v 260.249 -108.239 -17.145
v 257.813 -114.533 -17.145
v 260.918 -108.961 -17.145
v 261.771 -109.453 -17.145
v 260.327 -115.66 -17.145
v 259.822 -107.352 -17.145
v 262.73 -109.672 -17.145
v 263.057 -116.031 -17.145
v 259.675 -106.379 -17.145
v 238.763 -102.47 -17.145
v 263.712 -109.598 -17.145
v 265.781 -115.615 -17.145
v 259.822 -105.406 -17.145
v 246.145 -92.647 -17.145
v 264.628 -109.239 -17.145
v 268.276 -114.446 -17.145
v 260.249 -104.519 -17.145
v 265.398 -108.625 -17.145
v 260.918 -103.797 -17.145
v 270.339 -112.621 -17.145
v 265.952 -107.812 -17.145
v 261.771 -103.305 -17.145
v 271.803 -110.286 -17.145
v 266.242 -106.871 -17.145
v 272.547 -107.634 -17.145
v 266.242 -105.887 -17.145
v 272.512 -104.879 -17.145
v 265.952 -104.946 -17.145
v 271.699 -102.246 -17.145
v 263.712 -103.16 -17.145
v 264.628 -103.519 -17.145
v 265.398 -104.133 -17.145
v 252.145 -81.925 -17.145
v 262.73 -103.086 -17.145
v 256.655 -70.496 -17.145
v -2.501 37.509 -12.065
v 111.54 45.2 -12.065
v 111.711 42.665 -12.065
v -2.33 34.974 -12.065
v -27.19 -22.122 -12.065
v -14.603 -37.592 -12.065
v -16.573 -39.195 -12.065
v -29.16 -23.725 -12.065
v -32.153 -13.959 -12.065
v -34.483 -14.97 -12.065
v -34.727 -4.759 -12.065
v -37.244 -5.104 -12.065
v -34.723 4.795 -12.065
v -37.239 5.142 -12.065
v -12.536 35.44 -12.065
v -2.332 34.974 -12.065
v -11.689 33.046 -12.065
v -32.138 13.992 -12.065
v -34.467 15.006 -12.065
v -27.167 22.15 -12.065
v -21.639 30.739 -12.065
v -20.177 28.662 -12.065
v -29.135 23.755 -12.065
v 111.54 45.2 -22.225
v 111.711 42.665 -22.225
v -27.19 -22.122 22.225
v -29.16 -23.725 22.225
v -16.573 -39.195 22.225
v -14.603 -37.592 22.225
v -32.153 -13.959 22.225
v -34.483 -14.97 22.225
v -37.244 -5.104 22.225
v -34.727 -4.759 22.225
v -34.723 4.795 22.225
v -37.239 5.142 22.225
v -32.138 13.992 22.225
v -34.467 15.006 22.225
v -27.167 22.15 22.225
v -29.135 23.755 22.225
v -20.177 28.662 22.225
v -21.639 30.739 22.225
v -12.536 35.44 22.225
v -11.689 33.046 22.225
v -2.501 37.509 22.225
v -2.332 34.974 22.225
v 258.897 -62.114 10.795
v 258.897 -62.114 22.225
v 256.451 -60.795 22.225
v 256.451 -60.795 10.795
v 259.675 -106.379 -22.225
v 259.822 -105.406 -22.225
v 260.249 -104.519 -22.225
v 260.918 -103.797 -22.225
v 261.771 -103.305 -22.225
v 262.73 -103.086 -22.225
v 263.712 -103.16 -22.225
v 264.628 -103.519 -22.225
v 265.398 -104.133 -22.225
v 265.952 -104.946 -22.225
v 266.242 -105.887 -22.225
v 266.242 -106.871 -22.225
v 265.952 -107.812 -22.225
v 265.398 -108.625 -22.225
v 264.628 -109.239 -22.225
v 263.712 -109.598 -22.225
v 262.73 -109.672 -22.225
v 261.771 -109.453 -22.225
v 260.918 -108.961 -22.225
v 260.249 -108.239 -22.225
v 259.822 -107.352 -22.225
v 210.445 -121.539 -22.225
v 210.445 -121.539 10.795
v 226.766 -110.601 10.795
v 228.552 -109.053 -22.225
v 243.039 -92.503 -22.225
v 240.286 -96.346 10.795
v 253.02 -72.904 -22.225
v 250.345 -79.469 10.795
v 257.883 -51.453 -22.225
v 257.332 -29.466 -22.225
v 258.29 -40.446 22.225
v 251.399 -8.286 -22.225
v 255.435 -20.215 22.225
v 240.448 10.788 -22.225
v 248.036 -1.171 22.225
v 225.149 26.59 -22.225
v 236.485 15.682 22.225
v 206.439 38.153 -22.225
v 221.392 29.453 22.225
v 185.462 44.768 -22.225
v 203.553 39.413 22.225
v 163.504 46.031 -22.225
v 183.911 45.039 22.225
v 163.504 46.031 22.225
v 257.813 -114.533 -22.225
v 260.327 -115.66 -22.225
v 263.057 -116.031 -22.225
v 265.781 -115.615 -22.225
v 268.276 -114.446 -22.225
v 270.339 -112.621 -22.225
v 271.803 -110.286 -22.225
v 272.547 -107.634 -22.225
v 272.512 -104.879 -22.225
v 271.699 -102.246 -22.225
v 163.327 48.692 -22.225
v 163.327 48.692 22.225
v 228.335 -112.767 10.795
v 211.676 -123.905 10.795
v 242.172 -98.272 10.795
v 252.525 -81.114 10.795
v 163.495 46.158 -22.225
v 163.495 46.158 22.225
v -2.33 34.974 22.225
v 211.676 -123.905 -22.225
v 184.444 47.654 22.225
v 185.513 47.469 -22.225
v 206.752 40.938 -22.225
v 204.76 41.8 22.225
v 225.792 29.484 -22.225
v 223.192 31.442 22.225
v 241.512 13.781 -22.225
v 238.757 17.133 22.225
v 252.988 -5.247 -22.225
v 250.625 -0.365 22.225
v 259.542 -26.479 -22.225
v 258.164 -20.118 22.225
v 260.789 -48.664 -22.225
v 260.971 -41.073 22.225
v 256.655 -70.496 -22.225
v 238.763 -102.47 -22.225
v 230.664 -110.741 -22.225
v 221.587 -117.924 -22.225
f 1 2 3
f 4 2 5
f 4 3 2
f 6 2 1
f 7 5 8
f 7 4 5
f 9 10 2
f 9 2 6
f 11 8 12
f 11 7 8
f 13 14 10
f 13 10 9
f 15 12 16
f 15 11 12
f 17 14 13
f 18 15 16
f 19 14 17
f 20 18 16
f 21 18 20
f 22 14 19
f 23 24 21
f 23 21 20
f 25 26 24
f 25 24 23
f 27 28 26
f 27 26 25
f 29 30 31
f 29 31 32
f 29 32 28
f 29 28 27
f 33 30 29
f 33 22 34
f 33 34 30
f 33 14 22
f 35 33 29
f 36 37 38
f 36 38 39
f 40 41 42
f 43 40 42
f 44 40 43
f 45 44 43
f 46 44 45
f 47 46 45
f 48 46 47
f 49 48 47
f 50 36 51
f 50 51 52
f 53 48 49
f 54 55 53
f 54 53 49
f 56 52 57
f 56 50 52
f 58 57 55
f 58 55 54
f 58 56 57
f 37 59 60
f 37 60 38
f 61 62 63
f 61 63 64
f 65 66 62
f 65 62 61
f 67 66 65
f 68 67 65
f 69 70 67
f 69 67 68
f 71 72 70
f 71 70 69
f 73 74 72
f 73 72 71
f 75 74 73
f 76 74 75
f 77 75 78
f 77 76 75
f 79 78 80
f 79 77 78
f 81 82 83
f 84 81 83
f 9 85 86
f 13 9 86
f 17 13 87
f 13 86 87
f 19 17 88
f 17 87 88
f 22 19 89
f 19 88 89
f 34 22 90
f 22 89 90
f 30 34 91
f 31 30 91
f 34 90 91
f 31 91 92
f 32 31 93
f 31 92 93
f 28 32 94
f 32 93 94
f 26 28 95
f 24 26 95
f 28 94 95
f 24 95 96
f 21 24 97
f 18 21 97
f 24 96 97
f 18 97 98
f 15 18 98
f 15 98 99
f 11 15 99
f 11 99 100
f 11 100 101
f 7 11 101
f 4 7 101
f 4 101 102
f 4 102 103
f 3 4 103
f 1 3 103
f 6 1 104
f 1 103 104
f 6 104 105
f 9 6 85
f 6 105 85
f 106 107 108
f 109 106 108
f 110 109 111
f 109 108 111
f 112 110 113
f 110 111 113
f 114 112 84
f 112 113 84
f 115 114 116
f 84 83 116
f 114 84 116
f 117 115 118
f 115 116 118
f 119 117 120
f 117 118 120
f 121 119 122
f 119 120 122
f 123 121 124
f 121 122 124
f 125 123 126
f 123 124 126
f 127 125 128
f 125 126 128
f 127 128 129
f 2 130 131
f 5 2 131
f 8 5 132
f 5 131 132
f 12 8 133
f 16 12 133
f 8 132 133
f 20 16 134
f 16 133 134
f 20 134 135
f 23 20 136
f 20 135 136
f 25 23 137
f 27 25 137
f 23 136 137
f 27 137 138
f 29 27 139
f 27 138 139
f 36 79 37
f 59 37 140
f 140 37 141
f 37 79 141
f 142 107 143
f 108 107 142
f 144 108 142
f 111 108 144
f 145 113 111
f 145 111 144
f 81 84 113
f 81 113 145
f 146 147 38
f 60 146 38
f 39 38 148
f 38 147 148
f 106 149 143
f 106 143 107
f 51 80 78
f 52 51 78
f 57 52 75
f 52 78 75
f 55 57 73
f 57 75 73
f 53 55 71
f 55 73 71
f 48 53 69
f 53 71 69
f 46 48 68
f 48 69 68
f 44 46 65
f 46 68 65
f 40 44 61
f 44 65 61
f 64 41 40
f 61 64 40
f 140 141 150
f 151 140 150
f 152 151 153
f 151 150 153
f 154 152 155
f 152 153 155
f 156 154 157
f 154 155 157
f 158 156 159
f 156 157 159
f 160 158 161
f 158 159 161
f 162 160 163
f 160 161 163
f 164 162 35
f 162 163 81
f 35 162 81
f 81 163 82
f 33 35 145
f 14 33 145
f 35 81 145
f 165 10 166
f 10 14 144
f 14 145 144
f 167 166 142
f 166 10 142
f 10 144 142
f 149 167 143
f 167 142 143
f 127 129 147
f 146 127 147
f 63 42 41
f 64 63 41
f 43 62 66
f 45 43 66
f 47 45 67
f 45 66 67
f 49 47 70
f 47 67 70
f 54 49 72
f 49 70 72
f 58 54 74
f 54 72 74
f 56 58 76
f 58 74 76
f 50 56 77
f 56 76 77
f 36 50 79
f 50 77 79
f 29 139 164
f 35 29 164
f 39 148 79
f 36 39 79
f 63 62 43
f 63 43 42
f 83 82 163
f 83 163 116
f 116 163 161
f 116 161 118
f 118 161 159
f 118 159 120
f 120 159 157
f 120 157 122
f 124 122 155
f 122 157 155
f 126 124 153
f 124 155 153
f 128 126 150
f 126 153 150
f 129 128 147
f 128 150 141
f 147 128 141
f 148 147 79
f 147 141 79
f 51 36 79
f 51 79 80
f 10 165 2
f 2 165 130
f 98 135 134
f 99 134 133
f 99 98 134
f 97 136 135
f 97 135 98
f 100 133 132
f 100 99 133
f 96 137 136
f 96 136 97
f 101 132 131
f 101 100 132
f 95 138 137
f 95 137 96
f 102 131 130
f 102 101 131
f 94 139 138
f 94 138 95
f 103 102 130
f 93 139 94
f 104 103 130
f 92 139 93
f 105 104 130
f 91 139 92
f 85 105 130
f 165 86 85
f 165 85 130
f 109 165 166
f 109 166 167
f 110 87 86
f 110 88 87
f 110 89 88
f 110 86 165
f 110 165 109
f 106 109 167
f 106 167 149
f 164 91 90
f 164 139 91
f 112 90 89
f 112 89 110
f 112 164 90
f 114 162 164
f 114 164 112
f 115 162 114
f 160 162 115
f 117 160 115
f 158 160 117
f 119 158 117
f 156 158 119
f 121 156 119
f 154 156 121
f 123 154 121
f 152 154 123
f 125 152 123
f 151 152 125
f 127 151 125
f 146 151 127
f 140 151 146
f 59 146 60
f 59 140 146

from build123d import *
from OCP.BRepAlgoAPI import BRepAlgoAPI_Cut
from OCP.TopTools import TopTools_ListOfShape

# Parameters (mm, degrees)
EXTRUDE_THIN1_DEPTH = 22.224999999999998
EXTRUDE_THIN2_DEPTH = 22.224999999999998
EXTRUDE_THIN3_DEPTH = 22.224999999999998
CUT_EXTRUDE2_DEPTH  = 11.43
SKETCH11_R          = 3.3020000000000405
BOSS_EXTRUDE1_DEPTH = 5.08
CUT_EXTRUDE5_DEPTH  = 303.7454642008095
BOSS_EXTRUDE5_DEPTH = 44.45
CUT_EXTRUDE7_DEPTH  = 320.7810072191918


with BuildPart() as part:
    # Sketch1 → Extrude-Thin1 (new, symmetric)
    with BuildSketch(Plane.XY):
        with BuildLine():
            ThreePointArc((-2.331833528473019, 34.974351407788646), (-33.41280778757034, 10.593723601778466), (-22.057728390521078, -27.2415))
            Line((-22.057728390521078, -27.2415), (-23.65611450577623, -29.215521739130434))
            ThreePointArc((-23.65611450577623, -29.215521739130434), (-35.83402574319137, 11.361384732342133), (-2.500806972565267, 37.50872469820812))
            Line((-2.500806972565267, 37.50872469820812), (-2.331833528473019, 34.974351407788646))
        make_face()
    extrude(amount=EXTRUDE_THIN1_DEPTH, both=True)

    # Sketch17 → Cut-Extrude5 (cut, through all)
    with BuildSketch(Plane.XY.offset(22.224999999999998)):
        with BuildLine():
            Line((-29.159882495618955, -23.724664736128418), (-27.18962016483388, -22.121646848552164))
            Line((-27.18962016483388, -22.121646848552164), (-22.057728390521085, -27.24149999999998))
            Line((-22.057728390521085, -27.24149999999998), (-23.65611450577624, -29.215521739130416))
            ThreePointArc((-23.65611450577624, -29.215521739130416), (-26.550325091601046, -26.6127544897235), (-29.159882495618955, -23.724664736128418))
        make_face()
    extrude(amount=-CUT_EXTRUDE5_DEPTH, mode=Mode.SUBTRACT)

    # Sketch18 → Boss-Extrude5 (add, through all)
    with BuildSketch(Plane.XY.offset(22.224999999999998)):
        with BuildLine():
            Line((-29.159882495618955, -23.724664736128418), (-16.57310537390898, -39.19501788757624))
            Line((-16.57310537390898, -39.19501788757624), (-14.602843043123915, -37.59199999999999))
            Line((-14.602843043123915, -37.59199999999999), (-27.18962016483388, -22.121646848552164))
            ThreePointArc((-27.18962016483388, -22.121646848552164), (-32.138253083569026, 13.99197601257467), (-2.3318335284730156, 34.97435140778865))
            Line((-2.3318335284730156, 34.97435140778865), (-2.5008069725652633, 37.50872469820813))
            ThreePointArc((-2.5008069725652633, 37.50872469820813), (-34.46711200266824, 15.005887317833707), (-29.159882495618955, -23.724664736128418))
        make_face()
    extrude(amount=-BOSS_EXTRUDE5_DEPTH)


with BuildPart() as body_2:
    # Sketch2 → Extrude-Thin2 (new, symmetric)
    with BuildSketch(Plane.XY):
        with BuildLine():
            ThreePointArc((210.44489740889506, -121.53899999999999), (255.02266889982377, -18.69178601947969), (163.5039294567713, 46.031065164681365))
            Line((163.5039294567713, 46.031065164681365), (163.32650734047442, 48.69215711962181))
            ThreePointArc((163.32650734047442, 48.69215711962181), (257.5908089668185, -17.972379600064077), (211.6757043311619, -123.90500999999999))
            Line((211.6757043311619, -123.90500999999999), (210.44489740889506, -121.53899999999999))
        make_face()
    extrude(amount=EXTRUDE_THIN2_DEPTH, both=True)

    # Sketch4 → Extrude-Thin3 (add, symmetric)
    with BuildSketch(Plane.XY):
        Polygon((-2.5008069725652633, 37.50872469820813), (163.3265073404744, 48.69215711962182), (163.4974173036775, 46.157913685285266), (-2.329897009362141, 34.974481263871574), align=None)
    extrude(amount=EXTRUDE_THIN3_DEPTH, both=True)

    # Sketch9 → Cut-Extrude2 (cut)
    with BuildSketch(Plane.XY.offset(22.224999999999998)):
        with BuildLine():
            Line((210.44489740889503, -121.53899999999999), (211.6757043311619, -123.90501))
            ThreePointArc((211.6757043311619, -123.90501), (242.1722048894427, -98.27183057442694), (258.8971357878048, -62.11421560593305))
            Line((258.8971357878048, -62.11421560593305), (256.45118461979064, -60.79476951620356))
            ThreePointArc((256.45118461979064, -60.79476951620356), (240.28626889776245, -96.34600174604482), (210.44489740889503, -121.53899999999999))
        make_face()
    extrude(amount=-CUT_EXTRUDE2_DEPTH, mode=Mode.SUBTRACT)

    # Sketch11 → Boss-Extrude1 (add)
    with BuildSketch(Plane(origin=(0, 0, -22.224999999999998), x_dir=(-1, 0, 0), z_dir=(0, 0, -1))):
        with BuildLine():
            Line((-271.69936572083293, -102.24607705891748), (-256.65524104314295, -70.49607705891748))
            ThreePointArc((-256.65524104314295, -70.49607705891748), (-249.32472481112566, -87.38699545967683), (-238.76306857281796, -102.46980057519824))
            Line((-238.76306857281796, -102.46980057519824), (-257.813068572818, -114.53346259368794))
            ThreePointArc((-257.813068572818, -114.53346259368794), (-269.373124822864, -113.60745846421521), (-271.69936572083293, -102.24607705891748))
        make_face()
        with Locations((-262.9769824854714, -106.37901000000001)):
            Circle(SKETCH11_R, mode=Mode.SUBTRACT)
    extrude(amount=-BOSS_EXTRUDE1_DEPTH)


with BuildPart() as cut_extrude7_tool:
    # Sketch19 → Cut-Extrude7 (new, through all)
    with BuildSketch(Plane(origin=(-2.529466716951779, 37.50679187841974, 0), x_dir=(0.9977336355655706, 0.06728738708784333, 0), z_dir=(-0.06728738708784333, 0.9977336355655706, 0))):
        Polygon((-37.591999999999985, 22.224999999999998), (114.3287248453544, 22.224999999999998), (114.32872484535442, 12.064999999999998), (-37.591999999999985, 12.064999999999998), align=None)
    extrude(amount=-CUT_EXTRUDE7_DEPTH)


with BuildPart() as part_1:
    add(part.part)

    # Cut-Extrude7: cut by cut_extrude7_tool, with a tolerance
    cut_extrude7_stock = TopTools_ListOfShape()
    cut_extrude7_stock.Append(part_1.part.wrapped)
    cut_extrude7_tools = TopTools_ListOfShape()
    cut_extrude7_tools.Append(cut_extrude7_tool.part.wrapped)
    cut_extrude7_cut = BRepAlgoAPI_Cut()
    cut_extrude7_cut.SetArguments(cut_extrude7_stock)
    cut_extrude7_cut.SetTools(cut_extrude7_tools)
    cut_extrude7_cut.SetFuzzyValue(0.00001)
    cut_extrude7_cut.Build()
    add(Compound.cast(cut_extrude7_cut.Shape()).solids(), mode=Mode.REPLACE)


with BuildPart() as body_2_1:
    add(body_2.part)

    # Cut-Extrude7: cut by cut_extrude7_tool, with a tolerance
    cut_extrude7_2_stock = TopTools_ListOfShape()
    cut_extrude7_2_stock.Append(body_2_1.part.wrapped)
    cut_extrude7_2_tools = TopTools_ListOfShape()
    cut_extrude7_2_tools.Append(cut_extrude7_tool.part.wrapped)
    cut_extrude7_2_cut = BRepAlgoAPI_Cut()
    cut_extrude7_2_cut.SetArguments(cut_extrude7_2_stock)
    cut_extrude7_2_cut.SetTools(cut_extrude7_2_tools)
    cut_extrude7_2_cut.SetFuzzyValue(0.00001)
    cut_extrude7_2_cut.Build()
    add(Compound.cast(cut_extrude7_2_cut.Shape()).solids(), mode=Mode.REPLACE)


solid = Compound([part_1.part, body_2_1.part])
